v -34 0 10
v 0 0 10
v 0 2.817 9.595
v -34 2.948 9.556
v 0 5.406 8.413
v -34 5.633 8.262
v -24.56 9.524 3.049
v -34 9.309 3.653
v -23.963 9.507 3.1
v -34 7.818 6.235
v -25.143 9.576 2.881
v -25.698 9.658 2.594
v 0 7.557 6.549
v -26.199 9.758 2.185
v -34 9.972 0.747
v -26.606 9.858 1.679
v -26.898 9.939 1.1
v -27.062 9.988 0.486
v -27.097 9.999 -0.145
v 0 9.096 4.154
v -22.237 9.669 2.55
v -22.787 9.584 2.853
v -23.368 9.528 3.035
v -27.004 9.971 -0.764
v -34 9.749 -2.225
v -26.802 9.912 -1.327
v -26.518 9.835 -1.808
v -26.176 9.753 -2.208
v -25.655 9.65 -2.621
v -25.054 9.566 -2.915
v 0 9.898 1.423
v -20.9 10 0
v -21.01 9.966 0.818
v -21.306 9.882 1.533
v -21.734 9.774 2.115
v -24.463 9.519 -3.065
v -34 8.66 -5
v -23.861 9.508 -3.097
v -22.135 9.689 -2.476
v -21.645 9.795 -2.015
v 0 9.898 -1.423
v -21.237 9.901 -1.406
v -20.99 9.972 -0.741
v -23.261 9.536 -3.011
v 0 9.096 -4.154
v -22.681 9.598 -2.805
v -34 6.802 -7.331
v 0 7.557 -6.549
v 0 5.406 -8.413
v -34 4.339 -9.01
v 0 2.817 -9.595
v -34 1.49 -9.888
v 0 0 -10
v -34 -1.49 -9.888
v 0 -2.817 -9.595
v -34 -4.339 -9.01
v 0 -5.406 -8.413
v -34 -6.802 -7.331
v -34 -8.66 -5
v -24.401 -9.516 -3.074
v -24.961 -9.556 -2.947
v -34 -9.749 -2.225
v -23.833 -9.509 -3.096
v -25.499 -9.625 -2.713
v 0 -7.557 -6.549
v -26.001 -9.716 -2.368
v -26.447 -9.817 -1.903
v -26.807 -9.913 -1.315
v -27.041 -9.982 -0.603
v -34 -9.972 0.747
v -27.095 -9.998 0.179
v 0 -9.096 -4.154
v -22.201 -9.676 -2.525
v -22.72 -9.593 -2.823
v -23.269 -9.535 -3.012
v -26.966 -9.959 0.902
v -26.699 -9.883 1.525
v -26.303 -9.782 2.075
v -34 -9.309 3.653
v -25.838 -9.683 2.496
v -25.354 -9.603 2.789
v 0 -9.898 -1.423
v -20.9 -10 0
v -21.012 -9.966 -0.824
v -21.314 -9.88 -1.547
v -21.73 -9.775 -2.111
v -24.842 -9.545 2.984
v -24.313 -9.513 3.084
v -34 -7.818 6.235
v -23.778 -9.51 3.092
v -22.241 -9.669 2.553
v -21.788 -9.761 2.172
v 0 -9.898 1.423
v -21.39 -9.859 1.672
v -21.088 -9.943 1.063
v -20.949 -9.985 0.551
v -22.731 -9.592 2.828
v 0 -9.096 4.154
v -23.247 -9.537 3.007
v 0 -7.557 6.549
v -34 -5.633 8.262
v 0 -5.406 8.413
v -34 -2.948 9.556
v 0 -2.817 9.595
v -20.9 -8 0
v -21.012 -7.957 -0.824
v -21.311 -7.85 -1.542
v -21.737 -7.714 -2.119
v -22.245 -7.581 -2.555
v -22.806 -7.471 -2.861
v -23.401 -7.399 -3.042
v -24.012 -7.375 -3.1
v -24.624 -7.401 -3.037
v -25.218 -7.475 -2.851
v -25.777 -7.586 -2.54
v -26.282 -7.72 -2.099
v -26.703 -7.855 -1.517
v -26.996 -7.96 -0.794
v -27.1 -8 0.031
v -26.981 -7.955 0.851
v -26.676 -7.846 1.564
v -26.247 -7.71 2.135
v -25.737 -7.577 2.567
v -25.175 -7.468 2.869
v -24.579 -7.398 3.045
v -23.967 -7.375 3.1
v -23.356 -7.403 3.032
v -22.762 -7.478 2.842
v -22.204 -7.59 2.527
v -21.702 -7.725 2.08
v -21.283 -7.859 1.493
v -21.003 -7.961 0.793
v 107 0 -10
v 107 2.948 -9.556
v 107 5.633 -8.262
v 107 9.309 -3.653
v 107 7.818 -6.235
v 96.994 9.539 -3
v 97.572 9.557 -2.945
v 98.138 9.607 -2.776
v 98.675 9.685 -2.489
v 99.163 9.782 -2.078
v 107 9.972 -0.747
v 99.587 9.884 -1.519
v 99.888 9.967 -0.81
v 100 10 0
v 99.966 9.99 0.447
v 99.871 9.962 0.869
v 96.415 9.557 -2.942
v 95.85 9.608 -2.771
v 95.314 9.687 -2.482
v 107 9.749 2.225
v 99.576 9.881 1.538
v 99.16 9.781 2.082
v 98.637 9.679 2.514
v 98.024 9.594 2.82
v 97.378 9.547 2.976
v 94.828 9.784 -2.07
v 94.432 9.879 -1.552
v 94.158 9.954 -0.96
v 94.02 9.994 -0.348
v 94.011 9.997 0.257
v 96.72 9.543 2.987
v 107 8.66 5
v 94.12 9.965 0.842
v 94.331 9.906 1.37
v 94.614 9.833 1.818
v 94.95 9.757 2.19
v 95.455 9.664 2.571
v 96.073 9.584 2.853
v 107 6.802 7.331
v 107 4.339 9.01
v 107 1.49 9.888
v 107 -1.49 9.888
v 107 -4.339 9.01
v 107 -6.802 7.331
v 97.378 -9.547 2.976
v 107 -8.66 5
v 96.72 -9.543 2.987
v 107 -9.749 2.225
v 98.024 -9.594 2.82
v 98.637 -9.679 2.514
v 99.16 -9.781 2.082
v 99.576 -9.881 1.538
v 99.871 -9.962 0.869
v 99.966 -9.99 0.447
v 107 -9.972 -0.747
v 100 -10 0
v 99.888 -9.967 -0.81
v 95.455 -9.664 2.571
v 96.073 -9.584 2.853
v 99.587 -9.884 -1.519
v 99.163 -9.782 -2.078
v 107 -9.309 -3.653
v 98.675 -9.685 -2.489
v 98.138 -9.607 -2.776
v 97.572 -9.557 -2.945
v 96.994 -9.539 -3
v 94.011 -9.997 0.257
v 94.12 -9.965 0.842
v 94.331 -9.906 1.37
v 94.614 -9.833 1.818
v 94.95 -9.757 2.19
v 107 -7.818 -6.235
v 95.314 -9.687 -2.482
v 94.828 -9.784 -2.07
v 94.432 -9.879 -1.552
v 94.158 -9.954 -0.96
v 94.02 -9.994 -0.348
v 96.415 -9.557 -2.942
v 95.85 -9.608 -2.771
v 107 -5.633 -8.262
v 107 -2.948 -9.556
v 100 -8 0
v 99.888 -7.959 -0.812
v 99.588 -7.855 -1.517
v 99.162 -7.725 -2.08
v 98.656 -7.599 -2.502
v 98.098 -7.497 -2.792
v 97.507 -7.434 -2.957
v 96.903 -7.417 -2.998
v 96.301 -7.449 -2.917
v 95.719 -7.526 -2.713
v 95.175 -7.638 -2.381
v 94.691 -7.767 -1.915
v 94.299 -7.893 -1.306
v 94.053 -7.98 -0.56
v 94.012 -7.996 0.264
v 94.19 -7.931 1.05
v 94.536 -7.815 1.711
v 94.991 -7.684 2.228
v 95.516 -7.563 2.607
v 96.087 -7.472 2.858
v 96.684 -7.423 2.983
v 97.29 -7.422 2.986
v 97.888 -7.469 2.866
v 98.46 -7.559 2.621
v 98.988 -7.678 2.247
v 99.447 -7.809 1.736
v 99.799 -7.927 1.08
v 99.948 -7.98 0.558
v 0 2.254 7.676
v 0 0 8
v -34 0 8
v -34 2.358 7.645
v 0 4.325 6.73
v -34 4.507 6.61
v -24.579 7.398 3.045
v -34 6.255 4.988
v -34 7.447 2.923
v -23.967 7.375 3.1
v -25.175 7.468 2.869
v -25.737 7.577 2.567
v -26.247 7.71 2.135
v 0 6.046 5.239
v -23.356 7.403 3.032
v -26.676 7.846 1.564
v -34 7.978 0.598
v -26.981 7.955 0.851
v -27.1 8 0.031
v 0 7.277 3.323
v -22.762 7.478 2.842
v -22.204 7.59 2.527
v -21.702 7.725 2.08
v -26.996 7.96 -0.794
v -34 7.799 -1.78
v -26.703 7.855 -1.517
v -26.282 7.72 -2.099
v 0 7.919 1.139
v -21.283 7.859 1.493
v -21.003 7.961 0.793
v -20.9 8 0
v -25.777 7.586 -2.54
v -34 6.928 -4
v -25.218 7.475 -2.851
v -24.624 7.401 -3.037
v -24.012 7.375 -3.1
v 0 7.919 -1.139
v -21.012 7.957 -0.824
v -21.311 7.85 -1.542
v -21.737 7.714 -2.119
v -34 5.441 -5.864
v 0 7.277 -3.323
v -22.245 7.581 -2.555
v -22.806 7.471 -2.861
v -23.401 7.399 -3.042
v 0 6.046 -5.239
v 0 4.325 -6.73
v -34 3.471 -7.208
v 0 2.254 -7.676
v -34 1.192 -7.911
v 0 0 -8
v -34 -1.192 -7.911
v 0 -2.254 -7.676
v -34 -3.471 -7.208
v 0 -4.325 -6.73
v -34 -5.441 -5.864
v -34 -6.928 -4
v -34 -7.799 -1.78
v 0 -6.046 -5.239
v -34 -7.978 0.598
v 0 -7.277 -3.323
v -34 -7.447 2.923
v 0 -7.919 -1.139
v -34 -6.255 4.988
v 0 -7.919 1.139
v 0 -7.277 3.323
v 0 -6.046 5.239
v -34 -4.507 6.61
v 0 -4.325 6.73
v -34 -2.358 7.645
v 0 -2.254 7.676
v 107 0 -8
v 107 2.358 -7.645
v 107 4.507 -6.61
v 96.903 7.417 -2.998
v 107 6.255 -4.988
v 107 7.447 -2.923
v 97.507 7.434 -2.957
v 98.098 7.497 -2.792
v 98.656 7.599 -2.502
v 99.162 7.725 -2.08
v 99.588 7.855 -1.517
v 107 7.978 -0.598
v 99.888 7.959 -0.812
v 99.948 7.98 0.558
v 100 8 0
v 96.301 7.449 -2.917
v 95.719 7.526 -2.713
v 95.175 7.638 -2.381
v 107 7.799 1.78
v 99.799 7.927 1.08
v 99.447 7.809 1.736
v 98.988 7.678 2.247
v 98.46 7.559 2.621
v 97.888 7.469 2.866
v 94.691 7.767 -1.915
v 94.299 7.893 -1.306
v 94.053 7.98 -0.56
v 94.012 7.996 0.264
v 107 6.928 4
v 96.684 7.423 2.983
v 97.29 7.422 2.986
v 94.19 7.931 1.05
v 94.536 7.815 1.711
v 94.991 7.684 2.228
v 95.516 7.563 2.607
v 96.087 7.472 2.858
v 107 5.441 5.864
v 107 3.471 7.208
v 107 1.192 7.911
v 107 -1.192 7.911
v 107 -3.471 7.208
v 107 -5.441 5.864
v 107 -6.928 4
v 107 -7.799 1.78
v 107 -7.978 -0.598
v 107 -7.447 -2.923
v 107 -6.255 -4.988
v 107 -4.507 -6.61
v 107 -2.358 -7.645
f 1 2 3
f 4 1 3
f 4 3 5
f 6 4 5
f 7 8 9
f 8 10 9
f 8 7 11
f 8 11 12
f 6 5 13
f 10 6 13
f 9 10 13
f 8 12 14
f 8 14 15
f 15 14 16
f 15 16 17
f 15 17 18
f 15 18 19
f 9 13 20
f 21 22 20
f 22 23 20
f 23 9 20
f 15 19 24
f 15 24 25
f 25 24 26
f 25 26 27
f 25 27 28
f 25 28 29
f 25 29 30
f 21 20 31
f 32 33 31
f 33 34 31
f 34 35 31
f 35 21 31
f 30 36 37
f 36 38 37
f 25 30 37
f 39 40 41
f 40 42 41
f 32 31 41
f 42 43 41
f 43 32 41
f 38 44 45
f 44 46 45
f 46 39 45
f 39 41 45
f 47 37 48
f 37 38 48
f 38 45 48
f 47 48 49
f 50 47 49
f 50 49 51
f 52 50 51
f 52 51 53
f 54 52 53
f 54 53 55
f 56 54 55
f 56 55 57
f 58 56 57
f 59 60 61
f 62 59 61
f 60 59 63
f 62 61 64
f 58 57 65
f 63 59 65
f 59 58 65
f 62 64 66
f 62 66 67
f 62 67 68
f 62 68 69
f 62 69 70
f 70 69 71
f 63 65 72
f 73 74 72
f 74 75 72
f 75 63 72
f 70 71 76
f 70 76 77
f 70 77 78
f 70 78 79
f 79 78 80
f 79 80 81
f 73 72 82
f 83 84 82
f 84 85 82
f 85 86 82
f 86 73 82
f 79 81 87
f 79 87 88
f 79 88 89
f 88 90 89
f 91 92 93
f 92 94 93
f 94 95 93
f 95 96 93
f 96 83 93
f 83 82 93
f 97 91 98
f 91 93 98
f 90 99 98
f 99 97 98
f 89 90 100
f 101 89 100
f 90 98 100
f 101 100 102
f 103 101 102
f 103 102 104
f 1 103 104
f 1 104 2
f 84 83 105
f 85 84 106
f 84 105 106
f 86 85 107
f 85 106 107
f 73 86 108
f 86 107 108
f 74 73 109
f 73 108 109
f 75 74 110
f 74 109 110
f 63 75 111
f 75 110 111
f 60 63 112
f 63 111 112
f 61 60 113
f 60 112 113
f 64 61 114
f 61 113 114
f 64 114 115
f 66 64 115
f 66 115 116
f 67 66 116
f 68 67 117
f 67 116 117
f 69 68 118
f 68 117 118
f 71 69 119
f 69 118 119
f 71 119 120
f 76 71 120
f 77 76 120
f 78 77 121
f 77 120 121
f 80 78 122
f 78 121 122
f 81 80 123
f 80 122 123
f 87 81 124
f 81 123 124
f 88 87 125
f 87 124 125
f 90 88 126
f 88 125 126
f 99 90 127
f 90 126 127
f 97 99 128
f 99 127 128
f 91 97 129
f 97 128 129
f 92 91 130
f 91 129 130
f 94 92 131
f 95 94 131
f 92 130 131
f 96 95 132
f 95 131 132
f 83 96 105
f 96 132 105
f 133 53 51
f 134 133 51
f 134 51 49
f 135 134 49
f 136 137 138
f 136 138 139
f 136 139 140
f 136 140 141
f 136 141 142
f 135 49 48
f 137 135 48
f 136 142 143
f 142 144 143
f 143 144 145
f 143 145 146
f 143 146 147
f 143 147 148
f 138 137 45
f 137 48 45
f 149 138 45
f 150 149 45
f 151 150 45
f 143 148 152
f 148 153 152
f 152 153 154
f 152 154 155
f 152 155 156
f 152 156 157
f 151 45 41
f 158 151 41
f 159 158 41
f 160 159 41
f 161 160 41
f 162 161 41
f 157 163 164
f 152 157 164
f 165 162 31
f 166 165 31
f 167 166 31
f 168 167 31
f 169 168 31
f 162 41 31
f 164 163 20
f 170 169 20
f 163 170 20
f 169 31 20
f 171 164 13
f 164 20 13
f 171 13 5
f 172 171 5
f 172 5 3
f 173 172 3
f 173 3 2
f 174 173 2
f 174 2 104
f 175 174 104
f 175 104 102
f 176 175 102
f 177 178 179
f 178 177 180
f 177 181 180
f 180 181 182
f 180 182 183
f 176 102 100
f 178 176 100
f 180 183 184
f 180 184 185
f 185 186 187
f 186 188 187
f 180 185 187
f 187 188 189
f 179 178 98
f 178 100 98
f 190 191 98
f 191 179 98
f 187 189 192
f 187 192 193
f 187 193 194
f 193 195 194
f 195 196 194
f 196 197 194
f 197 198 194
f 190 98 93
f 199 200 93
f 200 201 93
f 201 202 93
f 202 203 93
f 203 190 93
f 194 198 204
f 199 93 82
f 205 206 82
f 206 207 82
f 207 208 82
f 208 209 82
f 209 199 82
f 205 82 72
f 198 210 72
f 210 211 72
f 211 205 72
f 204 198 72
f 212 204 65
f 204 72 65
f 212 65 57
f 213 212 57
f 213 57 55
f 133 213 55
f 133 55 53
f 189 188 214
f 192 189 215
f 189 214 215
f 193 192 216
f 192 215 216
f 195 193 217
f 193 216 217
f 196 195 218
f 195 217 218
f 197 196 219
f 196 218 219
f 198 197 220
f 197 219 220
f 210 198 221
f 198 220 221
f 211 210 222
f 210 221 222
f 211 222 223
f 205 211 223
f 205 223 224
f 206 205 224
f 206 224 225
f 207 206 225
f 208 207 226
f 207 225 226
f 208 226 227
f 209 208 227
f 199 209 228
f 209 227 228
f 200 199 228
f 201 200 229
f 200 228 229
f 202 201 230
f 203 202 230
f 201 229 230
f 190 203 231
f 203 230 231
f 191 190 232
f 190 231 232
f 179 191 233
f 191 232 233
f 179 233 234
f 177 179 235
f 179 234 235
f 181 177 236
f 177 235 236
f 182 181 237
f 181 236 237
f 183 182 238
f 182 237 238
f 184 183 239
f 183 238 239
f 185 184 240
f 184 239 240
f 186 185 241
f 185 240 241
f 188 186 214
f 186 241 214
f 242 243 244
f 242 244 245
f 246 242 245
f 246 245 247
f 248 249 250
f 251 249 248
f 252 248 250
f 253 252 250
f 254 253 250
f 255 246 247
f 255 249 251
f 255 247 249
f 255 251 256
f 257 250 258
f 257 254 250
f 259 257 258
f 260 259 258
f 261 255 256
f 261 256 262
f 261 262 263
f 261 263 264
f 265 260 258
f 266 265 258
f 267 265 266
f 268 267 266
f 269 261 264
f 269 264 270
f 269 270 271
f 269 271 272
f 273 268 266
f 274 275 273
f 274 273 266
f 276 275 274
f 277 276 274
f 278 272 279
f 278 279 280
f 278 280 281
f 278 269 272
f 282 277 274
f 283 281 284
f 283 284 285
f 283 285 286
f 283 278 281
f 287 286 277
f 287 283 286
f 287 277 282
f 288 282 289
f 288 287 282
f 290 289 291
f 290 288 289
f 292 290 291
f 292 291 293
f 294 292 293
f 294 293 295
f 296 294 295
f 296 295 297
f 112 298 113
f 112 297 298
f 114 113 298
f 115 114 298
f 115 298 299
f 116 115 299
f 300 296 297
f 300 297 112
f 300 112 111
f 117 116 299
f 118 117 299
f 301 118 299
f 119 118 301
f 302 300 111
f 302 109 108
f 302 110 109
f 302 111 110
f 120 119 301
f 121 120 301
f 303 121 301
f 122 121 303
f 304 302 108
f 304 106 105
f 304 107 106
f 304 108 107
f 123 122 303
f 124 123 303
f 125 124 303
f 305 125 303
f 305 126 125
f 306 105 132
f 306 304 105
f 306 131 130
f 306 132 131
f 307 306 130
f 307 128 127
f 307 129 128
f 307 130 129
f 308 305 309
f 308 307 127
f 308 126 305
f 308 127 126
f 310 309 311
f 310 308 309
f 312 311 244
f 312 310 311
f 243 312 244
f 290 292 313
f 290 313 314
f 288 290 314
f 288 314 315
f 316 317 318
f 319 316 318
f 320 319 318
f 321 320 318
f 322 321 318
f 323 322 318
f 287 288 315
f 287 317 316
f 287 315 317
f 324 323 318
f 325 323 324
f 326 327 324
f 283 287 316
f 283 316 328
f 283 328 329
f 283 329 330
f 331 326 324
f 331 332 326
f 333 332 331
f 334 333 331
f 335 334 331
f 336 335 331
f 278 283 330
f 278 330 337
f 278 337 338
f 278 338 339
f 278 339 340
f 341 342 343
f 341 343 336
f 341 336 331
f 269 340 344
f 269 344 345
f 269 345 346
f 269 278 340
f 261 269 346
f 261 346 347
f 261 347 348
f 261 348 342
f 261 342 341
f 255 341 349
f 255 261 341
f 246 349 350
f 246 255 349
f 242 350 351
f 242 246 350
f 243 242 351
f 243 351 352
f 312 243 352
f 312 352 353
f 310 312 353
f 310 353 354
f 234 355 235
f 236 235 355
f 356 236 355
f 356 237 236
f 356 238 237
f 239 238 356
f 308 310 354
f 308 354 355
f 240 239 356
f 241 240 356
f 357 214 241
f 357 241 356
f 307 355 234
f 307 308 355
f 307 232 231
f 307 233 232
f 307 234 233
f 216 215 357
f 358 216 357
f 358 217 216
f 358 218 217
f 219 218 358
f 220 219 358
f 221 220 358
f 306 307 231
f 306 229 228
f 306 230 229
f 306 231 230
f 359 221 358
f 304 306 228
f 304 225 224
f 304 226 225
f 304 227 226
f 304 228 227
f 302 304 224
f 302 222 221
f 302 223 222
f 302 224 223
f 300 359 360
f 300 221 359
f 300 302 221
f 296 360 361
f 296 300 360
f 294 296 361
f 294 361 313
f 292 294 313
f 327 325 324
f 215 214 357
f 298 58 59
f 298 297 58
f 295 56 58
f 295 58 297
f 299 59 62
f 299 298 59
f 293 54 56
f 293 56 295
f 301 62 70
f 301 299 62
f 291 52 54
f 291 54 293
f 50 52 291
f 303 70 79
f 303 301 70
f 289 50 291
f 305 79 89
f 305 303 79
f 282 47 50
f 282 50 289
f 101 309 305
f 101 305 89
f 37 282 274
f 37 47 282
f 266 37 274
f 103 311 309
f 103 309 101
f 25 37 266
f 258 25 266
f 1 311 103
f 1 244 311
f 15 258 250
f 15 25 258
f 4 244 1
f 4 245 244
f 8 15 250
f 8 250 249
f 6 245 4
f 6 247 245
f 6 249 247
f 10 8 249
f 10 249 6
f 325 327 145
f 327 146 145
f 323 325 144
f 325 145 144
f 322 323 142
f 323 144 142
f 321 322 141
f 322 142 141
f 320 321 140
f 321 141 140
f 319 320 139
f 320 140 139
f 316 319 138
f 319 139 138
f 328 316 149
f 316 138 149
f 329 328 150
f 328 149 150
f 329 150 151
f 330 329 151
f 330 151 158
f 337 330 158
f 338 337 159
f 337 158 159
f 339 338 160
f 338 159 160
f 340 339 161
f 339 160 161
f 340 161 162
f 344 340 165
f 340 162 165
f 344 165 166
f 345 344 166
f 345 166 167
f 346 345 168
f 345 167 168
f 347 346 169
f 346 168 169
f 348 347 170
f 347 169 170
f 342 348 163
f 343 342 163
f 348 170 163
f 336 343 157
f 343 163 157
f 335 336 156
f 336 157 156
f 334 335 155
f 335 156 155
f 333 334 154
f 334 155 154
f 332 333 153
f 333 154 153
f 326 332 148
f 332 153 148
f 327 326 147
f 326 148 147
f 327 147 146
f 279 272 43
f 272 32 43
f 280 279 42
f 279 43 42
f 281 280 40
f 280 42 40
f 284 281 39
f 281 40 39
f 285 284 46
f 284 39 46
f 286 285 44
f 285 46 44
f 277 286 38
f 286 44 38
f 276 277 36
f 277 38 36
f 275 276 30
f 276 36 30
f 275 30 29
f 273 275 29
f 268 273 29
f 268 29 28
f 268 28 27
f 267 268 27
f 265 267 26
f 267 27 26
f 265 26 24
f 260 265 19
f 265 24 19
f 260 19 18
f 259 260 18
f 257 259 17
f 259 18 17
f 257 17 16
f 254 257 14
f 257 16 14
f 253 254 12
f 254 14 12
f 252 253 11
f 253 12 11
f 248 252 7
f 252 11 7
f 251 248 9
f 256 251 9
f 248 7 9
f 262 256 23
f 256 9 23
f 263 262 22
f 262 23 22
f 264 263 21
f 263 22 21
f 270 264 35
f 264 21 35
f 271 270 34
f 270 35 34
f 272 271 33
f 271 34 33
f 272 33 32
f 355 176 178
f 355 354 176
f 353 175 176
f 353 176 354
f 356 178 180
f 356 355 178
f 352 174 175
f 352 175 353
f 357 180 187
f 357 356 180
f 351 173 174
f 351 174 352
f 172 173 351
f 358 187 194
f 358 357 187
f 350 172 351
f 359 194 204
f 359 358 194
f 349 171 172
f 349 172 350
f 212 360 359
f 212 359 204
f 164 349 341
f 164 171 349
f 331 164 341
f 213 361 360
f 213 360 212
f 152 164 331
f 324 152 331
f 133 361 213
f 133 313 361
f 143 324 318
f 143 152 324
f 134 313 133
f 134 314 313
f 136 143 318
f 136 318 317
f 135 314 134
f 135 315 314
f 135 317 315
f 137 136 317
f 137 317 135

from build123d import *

# Parameters (mm, degrees)
SKETCH_1_R          = 10
SKETCH_1_R_2        = 8
EXTRUDE_1_DEPTH     = 107
SKETCH_2_R          = 10
SKETCH_2_R_2        = 8
EXTRUDE_2_DEPTH     = 34
SKETCH_3_R          = 3
CUT_EXTRUDE_1_DEPTH = 15
SKETCH_4_R          = 3.1
CUT_EXTRUDE_2_DEPTH = 10


with BuildPart() as part:
    # 草图1 → 凸台-拉伸1 (new body)
    with BuildSketch(Plane(origin=(0, 0, 0), x_dir=(0, 0, -1), z_dir=(1, 0, 0))):
        Circle(SKETCH_1_R)
        Circle(SKETCH_1_R_2, mode=Mode.SUBTRACT)
    extrude(amount=EXTRUDE_1_DEPTH)

    # 草图2 → 凸台-拉伸2 (add)
    with BuildSketch(Plane.ZY):
        Circle(SKETCH_2_R)
        Circle(SKETCH_2_R_2, mode=Mode.SUBTRACT)
    extrude(amount=EXTRUDE_2_DEPTH)

    # 草图3 → 切除-拉伸1 (cut, symmetric)
    with BuildSketch(Plane(origin=(0, 0, 0), x_dir=(1, 0, 0), z_dir=(0, 1, 0))):
        with Locations((97, 0)):
            Circle(SKETCH_3_R)
    extrude(amount=CUT_EXTRUDE_1_DEPTH, both=True, mode=Mode.SUBTRACT)

    # 草图4 → 切除-拉伸2 (cut, symmetric)
    with BuildSketch(Plane(origin=(0, 0, 0), x_dir=(1, 0, 0), z_dir=(0, 1, 0))):
        with Locations((-24, 0)):
            Circle(SKETCH_4_R)
    extrude(amount=CUT_EXTRUDE_2_DEPTH, both=True, mode=Mode.SUBTRACT)


solid = part.part
